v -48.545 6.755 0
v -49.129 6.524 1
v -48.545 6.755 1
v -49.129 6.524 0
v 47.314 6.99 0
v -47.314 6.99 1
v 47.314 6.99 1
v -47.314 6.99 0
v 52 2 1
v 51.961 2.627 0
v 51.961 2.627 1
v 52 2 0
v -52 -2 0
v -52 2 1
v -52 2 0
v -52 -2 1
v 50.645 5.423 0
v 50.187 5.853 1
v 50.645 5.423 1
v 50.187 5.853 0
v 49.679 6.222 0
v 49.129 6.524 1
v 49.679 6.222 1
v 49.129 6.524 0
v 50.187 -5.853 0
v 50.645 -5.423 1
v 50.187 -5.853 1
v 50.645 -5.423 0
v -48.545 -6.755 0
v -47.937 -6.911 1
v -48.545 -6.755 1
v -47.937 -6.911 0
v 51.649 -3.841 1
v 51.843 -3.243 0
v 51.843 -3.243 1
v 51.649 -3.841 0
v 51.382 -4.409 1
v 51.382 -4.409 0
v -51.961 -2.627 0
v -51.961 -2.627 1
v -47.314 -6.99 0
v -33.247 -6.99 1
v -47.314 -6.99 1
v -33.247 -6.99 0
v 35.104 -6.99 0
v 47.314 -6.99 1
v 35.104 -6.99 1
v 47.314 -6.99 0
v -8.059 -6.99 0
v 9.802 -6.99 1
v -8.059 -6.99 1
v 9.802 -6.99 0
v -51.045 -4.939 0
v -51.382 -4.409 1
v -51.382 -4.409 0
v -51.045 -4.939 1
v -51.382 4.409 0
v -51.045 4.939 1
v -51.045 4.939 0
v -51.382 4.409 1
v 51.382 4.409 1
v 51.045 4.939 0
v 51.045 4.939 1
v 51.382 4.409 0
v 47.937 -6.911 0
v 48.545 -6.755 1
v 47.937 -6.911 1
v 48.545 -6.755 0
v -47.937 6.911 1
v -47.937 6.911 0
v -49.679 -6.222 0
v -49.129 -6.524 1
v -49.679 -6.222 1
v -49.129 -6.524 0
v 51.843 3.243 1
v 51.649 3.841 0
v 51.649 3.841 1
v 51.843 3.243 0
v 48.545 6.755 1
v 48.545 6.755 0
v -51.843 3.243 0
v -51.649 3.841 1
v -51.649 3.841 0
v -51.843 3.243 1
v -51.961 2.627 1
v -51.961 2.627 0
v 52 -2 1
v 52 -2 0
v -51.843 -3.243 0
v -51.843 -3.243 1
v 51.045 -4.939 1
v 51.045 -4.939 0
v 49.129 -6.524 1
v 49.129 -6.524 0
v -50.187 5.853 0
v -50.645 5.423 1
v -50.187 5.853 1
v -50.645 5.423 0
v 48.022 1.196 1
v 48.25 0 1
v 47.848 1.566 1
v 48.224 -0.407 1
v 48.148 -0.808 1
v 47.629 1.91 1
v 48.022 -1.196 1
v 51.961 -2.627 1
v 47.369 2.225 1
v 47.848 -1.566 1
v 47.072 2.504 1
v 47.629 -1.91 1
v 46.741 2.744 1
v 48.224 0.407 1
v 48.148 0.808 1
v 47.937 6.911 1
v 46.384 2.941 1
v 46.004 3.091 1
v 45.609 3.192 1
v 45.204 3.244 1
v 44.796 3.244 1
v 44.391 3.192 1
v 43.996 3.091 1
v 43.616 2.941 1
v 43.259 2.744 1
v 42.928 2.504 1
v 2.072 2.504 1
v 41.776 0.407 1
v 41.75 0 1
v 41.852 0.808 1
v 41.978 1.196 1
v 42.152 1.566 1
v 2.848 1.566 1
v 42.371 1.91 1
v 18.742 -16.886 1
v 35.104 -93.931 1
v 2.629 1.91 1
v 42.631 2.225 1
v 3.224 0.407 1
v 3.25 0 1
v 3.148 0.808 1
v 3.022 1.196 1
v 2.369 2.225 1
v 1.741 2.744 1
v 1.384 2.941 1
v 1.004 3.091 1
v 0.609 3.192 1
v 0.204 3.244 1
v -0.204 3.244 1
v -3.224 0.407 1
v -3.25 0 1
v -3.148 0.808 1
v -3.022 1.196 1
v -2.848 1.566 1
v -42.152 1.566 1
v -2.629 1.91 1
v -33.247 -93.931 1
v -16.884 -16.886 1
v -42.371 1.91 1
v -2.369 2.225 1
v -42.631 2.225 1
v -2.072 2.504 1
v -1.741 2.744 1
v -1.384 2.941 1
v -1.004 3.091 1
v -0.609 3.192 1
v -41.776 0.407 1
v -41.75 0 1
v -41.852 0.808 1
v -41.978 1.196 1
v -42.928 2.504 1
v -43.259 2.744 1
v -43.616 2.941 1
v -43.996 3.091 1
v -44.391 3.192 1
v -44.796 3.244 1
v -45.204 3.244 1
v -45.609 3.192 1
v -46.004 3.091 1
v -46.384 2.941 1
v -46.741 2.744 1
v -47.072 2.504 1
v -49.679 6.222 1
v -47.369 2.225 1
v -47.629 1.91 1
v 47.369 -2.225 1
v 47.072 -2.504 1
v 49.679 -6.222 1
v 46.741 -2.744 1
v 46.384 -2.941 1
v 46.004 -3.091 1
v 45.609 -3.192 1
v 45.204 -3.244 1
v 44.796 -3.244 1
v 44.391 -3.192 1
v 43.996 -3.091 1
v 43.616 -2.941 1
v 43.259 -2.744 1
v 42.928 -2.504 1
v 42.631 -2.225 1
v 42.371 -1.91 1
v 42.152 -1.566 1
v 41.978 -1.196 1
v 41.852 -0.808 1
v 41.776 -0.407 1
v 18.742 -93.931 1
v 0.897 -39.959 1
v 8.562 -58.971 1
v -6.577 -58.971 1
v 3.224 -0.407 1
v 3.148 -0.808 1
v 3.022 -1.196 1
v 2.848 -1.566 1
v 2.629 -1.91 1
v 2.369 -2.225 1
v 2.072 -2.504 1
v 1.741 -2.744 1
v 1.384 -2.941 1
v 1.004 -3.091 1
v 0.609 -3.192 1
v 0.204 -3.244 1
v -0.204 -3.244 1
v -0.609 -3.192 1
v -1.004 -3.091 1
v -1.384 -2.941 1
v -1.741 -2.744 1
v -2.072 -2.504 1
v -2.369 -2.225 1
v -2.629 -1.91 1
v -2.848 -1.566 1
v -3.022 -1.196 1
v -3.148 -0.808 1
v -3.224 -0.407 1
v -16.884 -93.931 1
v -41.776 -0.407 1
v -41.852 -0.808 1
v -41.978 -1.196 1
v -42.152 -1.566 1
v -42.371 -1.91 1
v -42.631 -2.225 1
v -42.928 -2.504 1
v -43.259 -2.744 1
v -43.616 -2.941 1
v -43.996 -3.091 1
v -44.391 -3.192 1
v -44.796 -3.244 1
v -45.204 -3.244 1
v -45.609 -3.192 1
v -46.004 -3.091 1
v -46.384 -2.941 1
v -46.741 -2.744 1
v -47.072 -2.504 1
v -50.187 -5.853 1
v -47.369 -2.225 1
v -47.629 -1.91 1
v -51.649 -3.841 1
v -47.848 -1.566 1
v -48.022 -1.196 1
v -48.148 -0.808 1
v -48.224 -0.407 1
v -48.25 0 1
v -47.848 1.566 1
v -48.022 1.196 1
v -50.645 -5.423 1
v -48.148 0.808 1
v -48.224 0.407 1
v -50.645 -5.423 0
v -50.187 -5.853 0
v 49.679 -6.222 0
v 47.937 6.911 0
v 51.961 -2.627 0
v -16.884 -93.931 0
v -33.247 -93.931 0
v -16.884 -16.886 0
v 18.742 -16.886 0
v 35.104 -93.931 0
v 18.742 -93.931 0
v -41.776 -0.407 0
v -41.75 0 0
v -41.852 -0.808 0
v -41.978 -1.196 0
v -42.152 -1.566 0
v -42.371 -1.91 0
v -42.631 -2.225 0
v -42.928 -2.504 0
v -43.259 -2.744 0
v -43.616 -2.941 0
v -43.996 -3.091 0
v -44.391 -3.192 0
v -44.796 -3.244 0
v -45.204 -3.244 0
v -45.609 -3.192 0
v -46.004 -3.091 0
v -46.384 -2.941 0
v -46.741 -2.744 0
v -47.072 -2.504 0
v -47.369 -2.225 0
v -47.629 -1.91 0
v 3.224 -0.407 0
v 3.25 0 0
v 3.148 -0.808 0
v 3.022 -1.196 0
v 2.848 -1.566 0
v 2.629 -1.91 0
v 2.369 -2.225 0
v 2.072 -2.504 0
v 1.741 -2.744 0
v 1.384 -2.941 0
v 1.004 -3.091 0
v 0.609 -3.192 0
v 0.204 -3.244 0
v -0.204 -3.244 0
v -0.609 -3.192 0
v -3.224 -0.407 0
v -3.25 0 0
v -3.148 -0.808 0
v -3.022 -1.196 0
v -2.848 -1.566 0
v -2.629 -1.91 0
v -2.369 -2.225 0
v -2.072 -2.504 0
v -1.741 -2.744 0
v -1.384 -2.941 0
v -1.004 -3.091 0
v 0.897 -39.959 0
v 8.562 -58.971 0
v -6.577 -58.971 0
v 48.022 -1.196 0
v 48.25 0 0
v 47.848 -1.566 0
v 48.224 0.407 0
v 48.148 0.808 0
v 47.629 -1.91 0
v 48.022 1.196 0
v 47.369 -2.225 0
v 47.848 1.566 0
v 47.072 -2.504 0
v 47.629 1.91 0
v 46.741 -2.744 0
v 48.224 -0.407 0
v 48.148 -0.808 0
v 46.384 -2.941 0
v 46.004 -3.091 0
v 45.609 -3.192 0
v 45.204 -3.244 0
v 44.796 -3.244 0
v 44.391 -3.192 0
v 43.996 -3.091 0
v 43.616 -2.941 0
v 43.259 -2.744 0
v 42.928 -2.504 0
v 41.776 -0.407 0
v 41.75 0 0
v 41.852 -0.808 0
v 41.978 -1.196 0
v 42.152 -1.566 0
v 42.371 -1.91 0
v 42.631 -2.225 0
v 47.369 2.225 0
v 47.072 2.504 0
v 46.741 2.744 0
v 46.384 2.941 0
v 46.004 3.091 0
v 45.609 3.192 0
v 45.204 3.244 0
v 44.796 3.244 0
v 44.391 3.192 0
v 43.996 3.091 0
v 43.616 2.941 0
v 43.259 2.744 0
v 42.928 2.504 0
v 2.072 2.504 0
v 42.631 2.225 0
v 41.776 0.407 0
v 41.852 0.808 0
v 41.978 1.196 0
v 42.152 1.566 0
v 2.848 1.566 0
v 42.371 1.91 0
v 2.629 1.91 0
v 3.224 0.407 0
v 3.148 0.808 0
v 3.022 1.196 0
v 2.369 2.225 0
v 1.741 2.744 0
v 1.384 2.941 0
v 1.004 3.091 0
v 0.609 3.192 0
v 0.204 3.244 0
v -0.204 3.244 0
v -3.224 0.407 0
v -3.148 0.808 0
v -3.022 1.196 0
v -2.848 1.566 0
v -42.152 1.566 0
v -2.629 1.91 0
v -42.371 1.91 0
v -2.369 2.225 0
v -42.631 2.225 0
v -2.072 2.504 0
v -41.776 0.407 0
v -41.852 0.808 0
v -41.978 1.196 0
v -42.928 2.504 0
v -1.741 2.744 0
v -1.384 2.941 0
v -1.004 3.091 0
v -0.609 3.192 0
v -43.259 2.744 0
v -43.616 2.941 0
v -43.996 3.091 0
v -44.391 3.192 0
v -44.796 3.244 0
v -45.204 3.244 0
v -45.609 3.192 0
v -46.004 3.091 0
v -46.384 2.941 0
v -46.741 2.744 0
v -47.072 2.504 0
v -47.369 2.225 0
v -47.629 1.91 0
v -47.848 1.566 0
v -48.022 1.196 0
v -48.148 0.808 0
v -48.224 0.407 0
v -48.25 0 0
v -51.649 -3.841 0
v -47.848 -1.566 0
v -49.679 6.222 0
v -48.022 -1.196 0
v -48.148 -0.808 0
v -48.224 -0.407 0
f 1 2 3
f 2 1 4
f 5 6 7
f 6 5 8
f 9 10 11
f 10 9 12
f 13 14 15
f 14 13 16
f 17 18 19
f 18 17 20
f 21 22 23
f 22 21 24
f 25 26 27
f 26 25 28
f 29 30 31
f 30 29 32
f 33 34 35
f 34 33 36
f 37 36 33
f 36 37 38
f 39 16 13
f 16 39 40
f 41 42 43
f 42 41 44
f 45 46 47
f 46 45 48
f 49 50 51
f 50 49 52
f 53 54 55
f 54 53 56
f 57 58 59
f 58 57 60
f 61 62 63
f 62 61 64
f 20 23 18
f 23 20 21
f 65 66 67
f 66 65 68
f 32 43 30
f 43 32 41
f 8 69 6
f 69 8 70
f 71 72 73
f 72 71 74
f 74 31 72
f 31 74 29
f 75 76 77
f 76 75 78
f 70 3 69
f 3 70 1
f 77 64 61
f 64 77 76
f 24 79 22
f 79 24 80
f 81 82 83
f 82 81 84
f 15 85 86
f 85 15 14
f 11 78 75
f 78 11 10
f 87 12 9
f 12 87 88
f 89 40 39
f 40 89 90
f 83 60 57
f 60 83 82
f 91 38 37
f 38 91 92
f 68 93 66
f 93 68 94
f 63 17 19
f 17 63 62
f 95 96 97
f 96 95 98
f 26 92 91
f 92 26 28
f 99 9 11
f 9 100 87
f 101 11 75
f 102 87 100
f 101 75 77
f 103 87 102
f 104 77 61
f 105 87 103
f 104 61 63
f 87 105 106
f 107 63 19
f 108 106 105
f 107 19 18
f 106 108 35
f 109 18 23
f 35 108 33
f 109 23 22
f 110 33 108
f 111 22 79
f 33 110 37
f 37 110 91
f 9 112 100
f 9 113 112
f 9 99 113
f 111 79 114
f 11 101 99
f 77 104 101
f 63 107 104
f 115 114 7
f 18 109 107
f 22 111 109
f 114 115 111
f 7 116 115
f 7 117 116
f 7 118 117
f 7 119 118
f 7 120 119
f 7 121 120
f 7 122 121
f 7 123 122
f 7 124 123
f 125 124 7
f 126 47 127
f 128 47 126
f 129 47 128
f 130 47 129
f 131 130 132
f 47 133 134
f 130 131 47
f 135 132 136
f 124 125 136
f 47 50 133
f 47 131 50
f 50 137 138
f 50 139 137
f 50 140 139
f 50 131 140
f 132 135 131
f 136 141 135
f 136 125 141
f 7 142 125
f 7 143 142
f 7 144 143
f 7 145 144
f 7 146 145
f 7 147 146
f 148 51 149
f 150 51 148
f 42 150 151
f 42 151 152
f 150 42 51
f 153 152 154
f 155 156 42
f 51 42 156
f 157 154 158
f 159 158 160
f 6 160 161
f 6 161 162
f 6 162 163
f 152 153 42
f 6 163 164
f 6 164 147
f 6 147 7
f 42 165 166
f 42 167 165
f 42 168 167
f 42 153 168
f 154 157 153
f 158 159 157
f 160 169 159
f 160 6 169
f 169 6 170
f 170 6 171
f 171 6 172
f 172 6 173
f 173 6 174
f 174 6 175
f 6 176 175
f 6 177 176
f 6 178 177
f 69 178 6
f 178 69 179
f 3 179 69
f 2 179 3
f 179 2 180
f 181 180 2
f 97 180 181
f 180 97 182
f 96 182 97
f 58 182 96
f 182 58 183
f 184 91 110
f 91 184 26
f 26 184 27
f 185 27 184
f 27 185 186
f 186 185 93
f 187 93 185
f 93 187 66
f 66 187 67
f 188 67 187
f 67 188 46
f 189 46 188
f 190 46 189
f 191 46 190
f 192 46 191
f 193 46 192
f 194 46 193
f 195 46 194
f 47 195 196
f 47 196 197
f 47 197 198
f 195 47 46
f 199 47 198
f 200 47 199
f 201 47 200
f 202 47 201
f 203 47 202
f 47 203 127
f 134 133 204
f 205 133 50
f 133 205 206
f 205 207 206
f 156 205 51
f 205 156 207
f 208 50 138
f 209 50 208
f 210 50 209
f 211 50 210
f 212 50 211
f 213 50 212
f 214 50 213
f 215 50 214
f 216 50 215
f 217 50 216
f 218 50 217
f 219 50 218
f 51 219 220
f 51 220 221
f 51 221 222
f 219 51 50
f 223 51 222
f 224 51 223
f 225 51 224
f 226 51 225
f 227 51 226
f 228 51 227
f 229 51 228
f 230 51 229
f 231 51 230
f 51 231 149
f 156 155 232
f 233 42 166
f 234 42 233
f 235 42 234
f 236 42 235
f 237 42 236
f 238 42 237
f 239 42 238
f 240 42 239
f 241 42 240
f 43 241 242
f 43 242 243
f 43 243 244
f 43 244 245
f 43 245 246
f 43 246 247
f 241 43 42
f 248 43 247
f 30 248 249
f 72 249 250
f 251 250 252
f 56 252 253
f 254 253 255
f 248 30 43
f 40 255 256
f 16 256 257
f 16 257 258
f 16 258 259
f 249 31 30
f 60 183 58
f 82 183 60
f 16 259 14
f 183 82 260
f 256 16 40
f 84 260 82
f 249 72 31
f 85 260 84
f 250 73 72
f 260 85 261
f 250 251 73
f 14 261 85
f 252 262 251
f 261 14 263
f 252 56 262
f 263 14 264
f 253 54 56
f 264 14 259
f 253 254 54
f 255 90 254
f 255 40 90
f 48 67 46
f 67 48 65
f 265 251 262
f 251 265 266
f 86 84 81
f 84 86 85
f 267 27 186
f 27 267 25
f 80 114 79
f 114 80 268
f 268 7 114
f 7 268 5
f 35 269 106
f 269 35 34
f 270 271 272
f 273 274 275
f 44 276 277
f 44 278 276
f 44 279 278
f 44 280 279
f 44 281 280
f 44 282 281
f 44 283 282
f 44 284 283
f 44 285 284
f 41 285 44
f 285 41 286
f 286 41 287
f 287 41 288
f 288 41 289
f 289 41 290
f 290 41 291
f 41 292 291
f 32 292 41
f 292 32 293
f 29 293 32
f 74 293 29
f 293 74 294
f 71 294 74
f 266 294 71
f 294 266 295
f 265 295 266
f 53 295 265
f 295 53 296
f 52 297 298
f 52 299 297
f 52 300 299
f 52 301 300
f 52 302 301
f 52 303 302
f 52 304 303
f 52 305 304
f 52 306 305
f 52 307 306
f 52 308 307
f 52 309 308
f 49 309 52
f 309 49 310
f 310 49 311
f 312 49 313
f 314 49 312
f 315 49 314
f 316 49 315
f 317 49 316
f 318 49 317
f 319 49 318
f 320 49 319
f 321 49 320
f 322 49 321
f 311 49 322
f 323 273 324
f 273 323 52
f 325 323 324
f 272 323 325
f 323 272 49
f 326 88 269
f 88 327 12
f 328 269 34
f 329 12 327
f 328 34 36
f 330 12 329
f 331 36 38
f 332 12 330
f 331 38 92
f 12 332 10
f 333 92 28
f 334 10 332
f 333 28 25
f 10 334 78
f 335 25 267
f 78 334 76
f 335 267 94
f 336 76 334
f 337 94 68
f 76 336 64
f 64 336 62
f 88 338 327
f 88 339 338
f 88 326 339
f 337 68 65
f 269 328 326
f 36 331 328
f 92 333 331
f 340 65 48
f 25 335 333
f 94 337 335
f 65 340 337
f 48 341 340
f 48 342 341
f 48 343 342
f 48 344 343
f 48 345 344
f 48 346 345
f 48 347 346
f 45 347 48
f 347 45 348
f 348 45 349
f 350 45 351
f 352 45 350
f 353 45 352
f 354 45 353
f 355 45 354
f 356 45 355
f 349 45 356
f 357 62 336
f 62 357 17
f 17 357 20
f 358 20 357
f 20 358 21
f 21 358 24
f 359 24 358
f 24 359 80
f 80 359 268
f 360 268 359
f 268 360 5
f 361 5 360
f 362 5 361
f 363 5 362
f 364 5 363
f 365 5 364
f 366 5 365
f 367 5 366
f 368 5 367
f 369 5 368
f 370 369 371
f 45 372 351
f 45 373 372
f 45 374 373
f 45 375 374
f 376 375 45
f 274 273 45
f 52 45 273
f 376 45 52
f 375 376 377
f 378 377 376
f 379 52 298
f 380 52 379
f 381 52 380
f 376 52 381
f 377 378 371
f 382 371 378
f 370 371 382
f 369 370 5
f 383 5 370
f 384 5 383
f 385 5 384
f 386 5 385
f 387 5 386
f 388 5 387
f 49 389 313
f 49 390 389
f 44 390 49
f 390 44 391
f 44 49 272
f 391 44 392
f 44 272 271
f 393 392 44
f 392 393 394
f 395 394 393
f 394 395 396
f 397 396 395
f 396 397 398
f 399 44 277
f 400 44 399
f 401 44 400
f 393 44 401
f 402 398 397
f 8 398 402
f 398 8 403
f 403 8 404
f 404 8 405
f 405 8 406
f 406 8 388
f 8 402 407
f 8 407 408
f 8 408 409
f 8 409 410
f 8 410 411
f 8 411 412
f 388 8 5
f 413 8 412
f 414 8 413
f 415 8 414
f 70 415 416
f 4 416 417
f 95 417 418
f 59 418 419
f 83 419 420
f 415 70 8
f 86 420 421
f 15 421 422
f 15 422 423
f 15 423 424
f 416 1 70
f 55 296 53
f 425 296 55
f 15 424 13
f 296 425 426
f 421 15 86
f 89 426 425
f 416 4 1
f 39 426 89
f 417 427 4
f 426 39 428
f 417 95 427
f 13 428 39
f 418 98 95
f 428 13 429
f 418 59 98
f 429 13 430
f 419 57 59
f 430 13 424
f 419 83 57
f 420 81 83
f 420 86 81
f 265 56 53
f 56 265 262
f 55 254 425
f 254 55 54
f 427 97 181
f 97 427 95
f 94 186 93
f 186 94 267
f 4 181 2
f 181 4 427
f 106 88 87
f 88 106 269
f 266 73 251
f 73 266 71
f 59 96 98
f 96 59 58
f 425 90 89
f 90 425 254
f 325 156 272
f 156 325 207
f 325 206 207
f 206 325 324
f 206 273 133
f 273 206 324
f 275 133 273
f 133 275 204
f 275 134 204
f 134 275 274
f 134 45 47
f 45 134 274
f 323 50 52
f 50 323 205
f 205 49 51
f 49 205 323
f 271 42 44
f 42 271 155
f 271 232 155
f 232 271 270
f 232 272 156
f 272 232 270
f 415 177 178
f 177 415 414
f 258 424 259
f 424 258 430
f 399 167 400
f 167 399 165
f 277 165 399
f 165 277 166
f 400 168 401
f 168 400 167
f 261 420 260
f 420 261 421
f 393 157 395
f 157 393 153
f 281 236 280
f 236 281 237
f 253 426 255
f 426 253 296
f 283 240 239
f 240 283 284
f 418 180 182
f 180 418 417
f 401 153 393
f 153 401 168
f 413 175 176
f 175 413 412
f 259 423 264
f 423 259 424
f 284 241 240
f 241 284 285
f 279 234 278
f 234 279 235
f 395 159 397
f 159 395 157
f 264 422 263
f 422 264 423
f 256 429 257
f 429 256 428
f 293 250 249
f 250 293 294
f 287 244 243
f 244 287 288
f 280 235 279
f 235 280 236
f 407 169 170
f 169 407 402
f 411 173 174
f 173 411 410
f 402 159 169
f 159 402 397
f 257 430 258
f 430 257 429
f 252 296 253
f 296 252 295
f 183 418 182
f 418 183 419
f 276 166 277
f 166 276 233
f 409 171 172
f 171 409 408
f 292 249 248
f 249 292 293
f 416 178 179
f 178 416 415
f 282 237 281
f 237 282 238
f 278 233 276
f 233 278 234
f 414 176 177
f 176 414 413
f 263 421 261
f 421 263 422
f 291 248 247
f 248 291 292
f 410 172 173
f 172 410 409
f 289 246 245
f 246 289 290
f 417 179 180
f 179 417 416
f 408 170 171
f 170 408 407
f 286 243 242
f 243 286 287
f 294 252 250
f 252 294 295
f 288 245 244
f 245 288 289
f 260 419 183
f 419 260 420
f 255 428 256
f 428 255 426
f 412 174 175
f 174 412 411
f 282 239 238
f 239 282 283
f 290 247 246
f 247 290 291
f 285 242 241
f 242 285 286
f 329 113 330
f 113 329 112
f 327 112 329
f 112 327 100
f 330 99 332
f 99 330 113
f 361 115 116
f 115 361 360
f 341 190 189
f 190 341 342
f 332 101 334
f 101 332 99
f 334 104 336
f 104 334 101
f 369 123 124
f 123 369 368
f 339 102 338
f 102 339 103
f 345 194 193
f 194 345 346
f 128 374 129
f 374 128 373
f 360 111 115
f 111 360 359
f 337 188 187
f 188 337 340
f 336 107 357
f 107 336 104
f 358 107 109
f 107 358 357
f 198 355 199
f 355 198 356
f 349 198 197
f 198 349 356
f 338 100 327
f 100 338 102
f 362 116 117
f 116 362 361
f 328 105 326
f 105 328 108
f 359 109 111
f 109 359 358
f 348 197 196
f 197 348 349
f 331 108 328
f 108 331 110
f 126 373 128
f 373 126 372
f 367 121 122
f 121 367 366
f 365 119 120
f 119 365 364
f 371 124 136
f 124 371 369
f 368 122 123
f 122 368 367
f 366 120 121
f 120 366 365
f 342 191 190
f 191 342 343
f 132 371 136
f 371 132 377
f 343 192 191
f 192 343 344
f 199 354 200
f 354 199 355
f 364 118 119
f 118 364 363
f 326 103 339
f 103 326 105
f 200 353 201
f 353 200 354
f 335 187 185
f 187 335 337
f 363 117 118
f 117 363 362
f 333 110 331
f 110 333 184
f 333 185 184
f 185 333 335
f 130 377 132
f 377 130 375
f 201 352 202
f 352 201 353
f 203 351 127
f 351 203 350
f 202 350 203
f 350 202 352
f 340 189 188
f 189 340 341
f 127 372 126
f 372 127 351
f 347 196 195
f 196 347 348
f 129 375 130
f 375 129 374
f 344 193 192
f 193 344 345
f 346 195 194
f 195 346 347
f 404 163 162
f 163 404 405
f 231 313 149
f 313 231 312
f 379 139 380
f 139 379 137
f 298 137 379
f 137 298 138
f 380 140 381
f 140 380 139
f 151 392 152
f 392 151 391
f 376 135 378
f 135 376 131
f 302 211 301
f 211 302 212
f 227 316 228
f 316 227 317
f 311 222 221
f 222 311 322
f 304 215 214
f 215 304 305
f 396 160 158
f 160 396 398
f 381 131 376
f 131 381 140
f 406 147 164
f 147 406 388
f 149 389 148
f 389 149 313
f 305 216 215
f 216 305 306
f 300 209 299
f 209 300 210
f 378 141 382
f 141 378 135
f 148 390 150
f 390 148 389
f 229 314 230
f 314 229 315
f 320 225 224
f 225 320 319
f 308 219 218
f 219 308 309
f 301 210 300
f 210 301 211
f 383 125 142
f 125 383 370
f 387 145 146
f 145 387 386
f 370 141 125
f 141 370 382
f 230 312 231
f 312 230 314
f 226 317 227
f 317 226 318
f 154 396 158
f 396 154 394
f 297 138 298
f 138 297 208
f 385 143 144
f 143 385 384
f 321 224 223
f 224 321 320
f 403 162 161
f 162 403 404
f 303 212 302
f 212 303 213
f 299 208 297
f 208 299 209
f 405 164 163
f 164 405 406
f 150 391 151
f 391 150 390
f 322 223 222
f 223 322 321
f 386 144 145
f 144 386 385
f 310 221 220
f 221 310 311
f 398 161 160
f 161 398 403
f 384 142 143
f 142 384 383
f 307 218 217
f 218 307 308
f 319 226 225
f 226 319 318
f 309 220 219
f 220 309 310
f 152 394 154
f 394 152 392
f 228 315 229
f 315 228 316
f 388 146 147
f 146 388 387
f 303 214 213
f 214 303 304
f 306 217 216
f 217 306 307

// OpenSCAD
$fn = 50;


difference() {
	union() {
		translate(v = [0, 0, 0]) {
			rotate(a = [0, 0, 0]) {
				hull() {
					translate(v = [-47.0000000000, 2.0000000000, 0]) {
						rotate(a = [0, 0, 0]) {
							translate(v = [0, 0, 0]) {
								rotate(a = [0, 0, 0]) {
									cylinder(h = 1, r = 5);
								}
							}
						}
					}
					translate(v = [47.0000000000, 2.0000000000, 0]) {
						rotate(a = [0, 0, 0]) {
							translate(v = [0, 0, 0]) {
								rotate(a = [0, 0, 0]) {
									cylinder(h = 1, r = 5);
								}
							}
						}
					}
					translate(v = [-47.0000000000, -2.0000000000, 0]) {
						rotate(a = [0, 0, 0]) {
							translate(v = [0, 0, 0]) {
								rotate(a = [0, 0, 0]) {
									cylinder(h = 1, r = 5);
								}
							}
						}
					}
					translate(v = [47.0000000000, -2.0000000000, 0]) {
						rotate(a = [0, 0, 0]) {
							translate(v = [0, 0, 0]) {
								rotate(a = [0, 0, 0]) {
									cylinder(h = 1, r = 5);
								}
							}
						}
					}
				}
			}
		}
		translate(v = [0, 0, 0]) {
			rotate(a = [0, 0, 0]) {
				linear_extrude(height = 1) {
					text(font = "DejaVu Sans Mono:style=Bold", halign = "center", size = 95, text = "M", valign = "top");
				}
			}
		}
	}
	union() {
		translate(v = [-45.0000000000, 0.0000000000, -125.0000000000]) {
			rotate(a = [0, 0, 0]) {
				cylinder(h = 250, r = 3.2500000000);
			}
		}
		translate(v = [45.0000000000, 0.0000000000, -125.0000000000]) {
			rotate(a = [0, 0, 0]) {
				cylinder(h = 250, r = 3.2500000000);
			}
		}
		translate(v = [45.0000000000, 0.0000000000, -125.0000000000]) {
			rotate(a = [0, 0, 0]) {
				cylinder(h = 250, r = 3.2500000000);
			}
		}
		translate(v = [0, 0, -125.0000000000]) {
			rotate(a = [0, 0, 0]) {
				cylinder(h = 250, r = 3.2500000000);
			}
		}
	}
}
